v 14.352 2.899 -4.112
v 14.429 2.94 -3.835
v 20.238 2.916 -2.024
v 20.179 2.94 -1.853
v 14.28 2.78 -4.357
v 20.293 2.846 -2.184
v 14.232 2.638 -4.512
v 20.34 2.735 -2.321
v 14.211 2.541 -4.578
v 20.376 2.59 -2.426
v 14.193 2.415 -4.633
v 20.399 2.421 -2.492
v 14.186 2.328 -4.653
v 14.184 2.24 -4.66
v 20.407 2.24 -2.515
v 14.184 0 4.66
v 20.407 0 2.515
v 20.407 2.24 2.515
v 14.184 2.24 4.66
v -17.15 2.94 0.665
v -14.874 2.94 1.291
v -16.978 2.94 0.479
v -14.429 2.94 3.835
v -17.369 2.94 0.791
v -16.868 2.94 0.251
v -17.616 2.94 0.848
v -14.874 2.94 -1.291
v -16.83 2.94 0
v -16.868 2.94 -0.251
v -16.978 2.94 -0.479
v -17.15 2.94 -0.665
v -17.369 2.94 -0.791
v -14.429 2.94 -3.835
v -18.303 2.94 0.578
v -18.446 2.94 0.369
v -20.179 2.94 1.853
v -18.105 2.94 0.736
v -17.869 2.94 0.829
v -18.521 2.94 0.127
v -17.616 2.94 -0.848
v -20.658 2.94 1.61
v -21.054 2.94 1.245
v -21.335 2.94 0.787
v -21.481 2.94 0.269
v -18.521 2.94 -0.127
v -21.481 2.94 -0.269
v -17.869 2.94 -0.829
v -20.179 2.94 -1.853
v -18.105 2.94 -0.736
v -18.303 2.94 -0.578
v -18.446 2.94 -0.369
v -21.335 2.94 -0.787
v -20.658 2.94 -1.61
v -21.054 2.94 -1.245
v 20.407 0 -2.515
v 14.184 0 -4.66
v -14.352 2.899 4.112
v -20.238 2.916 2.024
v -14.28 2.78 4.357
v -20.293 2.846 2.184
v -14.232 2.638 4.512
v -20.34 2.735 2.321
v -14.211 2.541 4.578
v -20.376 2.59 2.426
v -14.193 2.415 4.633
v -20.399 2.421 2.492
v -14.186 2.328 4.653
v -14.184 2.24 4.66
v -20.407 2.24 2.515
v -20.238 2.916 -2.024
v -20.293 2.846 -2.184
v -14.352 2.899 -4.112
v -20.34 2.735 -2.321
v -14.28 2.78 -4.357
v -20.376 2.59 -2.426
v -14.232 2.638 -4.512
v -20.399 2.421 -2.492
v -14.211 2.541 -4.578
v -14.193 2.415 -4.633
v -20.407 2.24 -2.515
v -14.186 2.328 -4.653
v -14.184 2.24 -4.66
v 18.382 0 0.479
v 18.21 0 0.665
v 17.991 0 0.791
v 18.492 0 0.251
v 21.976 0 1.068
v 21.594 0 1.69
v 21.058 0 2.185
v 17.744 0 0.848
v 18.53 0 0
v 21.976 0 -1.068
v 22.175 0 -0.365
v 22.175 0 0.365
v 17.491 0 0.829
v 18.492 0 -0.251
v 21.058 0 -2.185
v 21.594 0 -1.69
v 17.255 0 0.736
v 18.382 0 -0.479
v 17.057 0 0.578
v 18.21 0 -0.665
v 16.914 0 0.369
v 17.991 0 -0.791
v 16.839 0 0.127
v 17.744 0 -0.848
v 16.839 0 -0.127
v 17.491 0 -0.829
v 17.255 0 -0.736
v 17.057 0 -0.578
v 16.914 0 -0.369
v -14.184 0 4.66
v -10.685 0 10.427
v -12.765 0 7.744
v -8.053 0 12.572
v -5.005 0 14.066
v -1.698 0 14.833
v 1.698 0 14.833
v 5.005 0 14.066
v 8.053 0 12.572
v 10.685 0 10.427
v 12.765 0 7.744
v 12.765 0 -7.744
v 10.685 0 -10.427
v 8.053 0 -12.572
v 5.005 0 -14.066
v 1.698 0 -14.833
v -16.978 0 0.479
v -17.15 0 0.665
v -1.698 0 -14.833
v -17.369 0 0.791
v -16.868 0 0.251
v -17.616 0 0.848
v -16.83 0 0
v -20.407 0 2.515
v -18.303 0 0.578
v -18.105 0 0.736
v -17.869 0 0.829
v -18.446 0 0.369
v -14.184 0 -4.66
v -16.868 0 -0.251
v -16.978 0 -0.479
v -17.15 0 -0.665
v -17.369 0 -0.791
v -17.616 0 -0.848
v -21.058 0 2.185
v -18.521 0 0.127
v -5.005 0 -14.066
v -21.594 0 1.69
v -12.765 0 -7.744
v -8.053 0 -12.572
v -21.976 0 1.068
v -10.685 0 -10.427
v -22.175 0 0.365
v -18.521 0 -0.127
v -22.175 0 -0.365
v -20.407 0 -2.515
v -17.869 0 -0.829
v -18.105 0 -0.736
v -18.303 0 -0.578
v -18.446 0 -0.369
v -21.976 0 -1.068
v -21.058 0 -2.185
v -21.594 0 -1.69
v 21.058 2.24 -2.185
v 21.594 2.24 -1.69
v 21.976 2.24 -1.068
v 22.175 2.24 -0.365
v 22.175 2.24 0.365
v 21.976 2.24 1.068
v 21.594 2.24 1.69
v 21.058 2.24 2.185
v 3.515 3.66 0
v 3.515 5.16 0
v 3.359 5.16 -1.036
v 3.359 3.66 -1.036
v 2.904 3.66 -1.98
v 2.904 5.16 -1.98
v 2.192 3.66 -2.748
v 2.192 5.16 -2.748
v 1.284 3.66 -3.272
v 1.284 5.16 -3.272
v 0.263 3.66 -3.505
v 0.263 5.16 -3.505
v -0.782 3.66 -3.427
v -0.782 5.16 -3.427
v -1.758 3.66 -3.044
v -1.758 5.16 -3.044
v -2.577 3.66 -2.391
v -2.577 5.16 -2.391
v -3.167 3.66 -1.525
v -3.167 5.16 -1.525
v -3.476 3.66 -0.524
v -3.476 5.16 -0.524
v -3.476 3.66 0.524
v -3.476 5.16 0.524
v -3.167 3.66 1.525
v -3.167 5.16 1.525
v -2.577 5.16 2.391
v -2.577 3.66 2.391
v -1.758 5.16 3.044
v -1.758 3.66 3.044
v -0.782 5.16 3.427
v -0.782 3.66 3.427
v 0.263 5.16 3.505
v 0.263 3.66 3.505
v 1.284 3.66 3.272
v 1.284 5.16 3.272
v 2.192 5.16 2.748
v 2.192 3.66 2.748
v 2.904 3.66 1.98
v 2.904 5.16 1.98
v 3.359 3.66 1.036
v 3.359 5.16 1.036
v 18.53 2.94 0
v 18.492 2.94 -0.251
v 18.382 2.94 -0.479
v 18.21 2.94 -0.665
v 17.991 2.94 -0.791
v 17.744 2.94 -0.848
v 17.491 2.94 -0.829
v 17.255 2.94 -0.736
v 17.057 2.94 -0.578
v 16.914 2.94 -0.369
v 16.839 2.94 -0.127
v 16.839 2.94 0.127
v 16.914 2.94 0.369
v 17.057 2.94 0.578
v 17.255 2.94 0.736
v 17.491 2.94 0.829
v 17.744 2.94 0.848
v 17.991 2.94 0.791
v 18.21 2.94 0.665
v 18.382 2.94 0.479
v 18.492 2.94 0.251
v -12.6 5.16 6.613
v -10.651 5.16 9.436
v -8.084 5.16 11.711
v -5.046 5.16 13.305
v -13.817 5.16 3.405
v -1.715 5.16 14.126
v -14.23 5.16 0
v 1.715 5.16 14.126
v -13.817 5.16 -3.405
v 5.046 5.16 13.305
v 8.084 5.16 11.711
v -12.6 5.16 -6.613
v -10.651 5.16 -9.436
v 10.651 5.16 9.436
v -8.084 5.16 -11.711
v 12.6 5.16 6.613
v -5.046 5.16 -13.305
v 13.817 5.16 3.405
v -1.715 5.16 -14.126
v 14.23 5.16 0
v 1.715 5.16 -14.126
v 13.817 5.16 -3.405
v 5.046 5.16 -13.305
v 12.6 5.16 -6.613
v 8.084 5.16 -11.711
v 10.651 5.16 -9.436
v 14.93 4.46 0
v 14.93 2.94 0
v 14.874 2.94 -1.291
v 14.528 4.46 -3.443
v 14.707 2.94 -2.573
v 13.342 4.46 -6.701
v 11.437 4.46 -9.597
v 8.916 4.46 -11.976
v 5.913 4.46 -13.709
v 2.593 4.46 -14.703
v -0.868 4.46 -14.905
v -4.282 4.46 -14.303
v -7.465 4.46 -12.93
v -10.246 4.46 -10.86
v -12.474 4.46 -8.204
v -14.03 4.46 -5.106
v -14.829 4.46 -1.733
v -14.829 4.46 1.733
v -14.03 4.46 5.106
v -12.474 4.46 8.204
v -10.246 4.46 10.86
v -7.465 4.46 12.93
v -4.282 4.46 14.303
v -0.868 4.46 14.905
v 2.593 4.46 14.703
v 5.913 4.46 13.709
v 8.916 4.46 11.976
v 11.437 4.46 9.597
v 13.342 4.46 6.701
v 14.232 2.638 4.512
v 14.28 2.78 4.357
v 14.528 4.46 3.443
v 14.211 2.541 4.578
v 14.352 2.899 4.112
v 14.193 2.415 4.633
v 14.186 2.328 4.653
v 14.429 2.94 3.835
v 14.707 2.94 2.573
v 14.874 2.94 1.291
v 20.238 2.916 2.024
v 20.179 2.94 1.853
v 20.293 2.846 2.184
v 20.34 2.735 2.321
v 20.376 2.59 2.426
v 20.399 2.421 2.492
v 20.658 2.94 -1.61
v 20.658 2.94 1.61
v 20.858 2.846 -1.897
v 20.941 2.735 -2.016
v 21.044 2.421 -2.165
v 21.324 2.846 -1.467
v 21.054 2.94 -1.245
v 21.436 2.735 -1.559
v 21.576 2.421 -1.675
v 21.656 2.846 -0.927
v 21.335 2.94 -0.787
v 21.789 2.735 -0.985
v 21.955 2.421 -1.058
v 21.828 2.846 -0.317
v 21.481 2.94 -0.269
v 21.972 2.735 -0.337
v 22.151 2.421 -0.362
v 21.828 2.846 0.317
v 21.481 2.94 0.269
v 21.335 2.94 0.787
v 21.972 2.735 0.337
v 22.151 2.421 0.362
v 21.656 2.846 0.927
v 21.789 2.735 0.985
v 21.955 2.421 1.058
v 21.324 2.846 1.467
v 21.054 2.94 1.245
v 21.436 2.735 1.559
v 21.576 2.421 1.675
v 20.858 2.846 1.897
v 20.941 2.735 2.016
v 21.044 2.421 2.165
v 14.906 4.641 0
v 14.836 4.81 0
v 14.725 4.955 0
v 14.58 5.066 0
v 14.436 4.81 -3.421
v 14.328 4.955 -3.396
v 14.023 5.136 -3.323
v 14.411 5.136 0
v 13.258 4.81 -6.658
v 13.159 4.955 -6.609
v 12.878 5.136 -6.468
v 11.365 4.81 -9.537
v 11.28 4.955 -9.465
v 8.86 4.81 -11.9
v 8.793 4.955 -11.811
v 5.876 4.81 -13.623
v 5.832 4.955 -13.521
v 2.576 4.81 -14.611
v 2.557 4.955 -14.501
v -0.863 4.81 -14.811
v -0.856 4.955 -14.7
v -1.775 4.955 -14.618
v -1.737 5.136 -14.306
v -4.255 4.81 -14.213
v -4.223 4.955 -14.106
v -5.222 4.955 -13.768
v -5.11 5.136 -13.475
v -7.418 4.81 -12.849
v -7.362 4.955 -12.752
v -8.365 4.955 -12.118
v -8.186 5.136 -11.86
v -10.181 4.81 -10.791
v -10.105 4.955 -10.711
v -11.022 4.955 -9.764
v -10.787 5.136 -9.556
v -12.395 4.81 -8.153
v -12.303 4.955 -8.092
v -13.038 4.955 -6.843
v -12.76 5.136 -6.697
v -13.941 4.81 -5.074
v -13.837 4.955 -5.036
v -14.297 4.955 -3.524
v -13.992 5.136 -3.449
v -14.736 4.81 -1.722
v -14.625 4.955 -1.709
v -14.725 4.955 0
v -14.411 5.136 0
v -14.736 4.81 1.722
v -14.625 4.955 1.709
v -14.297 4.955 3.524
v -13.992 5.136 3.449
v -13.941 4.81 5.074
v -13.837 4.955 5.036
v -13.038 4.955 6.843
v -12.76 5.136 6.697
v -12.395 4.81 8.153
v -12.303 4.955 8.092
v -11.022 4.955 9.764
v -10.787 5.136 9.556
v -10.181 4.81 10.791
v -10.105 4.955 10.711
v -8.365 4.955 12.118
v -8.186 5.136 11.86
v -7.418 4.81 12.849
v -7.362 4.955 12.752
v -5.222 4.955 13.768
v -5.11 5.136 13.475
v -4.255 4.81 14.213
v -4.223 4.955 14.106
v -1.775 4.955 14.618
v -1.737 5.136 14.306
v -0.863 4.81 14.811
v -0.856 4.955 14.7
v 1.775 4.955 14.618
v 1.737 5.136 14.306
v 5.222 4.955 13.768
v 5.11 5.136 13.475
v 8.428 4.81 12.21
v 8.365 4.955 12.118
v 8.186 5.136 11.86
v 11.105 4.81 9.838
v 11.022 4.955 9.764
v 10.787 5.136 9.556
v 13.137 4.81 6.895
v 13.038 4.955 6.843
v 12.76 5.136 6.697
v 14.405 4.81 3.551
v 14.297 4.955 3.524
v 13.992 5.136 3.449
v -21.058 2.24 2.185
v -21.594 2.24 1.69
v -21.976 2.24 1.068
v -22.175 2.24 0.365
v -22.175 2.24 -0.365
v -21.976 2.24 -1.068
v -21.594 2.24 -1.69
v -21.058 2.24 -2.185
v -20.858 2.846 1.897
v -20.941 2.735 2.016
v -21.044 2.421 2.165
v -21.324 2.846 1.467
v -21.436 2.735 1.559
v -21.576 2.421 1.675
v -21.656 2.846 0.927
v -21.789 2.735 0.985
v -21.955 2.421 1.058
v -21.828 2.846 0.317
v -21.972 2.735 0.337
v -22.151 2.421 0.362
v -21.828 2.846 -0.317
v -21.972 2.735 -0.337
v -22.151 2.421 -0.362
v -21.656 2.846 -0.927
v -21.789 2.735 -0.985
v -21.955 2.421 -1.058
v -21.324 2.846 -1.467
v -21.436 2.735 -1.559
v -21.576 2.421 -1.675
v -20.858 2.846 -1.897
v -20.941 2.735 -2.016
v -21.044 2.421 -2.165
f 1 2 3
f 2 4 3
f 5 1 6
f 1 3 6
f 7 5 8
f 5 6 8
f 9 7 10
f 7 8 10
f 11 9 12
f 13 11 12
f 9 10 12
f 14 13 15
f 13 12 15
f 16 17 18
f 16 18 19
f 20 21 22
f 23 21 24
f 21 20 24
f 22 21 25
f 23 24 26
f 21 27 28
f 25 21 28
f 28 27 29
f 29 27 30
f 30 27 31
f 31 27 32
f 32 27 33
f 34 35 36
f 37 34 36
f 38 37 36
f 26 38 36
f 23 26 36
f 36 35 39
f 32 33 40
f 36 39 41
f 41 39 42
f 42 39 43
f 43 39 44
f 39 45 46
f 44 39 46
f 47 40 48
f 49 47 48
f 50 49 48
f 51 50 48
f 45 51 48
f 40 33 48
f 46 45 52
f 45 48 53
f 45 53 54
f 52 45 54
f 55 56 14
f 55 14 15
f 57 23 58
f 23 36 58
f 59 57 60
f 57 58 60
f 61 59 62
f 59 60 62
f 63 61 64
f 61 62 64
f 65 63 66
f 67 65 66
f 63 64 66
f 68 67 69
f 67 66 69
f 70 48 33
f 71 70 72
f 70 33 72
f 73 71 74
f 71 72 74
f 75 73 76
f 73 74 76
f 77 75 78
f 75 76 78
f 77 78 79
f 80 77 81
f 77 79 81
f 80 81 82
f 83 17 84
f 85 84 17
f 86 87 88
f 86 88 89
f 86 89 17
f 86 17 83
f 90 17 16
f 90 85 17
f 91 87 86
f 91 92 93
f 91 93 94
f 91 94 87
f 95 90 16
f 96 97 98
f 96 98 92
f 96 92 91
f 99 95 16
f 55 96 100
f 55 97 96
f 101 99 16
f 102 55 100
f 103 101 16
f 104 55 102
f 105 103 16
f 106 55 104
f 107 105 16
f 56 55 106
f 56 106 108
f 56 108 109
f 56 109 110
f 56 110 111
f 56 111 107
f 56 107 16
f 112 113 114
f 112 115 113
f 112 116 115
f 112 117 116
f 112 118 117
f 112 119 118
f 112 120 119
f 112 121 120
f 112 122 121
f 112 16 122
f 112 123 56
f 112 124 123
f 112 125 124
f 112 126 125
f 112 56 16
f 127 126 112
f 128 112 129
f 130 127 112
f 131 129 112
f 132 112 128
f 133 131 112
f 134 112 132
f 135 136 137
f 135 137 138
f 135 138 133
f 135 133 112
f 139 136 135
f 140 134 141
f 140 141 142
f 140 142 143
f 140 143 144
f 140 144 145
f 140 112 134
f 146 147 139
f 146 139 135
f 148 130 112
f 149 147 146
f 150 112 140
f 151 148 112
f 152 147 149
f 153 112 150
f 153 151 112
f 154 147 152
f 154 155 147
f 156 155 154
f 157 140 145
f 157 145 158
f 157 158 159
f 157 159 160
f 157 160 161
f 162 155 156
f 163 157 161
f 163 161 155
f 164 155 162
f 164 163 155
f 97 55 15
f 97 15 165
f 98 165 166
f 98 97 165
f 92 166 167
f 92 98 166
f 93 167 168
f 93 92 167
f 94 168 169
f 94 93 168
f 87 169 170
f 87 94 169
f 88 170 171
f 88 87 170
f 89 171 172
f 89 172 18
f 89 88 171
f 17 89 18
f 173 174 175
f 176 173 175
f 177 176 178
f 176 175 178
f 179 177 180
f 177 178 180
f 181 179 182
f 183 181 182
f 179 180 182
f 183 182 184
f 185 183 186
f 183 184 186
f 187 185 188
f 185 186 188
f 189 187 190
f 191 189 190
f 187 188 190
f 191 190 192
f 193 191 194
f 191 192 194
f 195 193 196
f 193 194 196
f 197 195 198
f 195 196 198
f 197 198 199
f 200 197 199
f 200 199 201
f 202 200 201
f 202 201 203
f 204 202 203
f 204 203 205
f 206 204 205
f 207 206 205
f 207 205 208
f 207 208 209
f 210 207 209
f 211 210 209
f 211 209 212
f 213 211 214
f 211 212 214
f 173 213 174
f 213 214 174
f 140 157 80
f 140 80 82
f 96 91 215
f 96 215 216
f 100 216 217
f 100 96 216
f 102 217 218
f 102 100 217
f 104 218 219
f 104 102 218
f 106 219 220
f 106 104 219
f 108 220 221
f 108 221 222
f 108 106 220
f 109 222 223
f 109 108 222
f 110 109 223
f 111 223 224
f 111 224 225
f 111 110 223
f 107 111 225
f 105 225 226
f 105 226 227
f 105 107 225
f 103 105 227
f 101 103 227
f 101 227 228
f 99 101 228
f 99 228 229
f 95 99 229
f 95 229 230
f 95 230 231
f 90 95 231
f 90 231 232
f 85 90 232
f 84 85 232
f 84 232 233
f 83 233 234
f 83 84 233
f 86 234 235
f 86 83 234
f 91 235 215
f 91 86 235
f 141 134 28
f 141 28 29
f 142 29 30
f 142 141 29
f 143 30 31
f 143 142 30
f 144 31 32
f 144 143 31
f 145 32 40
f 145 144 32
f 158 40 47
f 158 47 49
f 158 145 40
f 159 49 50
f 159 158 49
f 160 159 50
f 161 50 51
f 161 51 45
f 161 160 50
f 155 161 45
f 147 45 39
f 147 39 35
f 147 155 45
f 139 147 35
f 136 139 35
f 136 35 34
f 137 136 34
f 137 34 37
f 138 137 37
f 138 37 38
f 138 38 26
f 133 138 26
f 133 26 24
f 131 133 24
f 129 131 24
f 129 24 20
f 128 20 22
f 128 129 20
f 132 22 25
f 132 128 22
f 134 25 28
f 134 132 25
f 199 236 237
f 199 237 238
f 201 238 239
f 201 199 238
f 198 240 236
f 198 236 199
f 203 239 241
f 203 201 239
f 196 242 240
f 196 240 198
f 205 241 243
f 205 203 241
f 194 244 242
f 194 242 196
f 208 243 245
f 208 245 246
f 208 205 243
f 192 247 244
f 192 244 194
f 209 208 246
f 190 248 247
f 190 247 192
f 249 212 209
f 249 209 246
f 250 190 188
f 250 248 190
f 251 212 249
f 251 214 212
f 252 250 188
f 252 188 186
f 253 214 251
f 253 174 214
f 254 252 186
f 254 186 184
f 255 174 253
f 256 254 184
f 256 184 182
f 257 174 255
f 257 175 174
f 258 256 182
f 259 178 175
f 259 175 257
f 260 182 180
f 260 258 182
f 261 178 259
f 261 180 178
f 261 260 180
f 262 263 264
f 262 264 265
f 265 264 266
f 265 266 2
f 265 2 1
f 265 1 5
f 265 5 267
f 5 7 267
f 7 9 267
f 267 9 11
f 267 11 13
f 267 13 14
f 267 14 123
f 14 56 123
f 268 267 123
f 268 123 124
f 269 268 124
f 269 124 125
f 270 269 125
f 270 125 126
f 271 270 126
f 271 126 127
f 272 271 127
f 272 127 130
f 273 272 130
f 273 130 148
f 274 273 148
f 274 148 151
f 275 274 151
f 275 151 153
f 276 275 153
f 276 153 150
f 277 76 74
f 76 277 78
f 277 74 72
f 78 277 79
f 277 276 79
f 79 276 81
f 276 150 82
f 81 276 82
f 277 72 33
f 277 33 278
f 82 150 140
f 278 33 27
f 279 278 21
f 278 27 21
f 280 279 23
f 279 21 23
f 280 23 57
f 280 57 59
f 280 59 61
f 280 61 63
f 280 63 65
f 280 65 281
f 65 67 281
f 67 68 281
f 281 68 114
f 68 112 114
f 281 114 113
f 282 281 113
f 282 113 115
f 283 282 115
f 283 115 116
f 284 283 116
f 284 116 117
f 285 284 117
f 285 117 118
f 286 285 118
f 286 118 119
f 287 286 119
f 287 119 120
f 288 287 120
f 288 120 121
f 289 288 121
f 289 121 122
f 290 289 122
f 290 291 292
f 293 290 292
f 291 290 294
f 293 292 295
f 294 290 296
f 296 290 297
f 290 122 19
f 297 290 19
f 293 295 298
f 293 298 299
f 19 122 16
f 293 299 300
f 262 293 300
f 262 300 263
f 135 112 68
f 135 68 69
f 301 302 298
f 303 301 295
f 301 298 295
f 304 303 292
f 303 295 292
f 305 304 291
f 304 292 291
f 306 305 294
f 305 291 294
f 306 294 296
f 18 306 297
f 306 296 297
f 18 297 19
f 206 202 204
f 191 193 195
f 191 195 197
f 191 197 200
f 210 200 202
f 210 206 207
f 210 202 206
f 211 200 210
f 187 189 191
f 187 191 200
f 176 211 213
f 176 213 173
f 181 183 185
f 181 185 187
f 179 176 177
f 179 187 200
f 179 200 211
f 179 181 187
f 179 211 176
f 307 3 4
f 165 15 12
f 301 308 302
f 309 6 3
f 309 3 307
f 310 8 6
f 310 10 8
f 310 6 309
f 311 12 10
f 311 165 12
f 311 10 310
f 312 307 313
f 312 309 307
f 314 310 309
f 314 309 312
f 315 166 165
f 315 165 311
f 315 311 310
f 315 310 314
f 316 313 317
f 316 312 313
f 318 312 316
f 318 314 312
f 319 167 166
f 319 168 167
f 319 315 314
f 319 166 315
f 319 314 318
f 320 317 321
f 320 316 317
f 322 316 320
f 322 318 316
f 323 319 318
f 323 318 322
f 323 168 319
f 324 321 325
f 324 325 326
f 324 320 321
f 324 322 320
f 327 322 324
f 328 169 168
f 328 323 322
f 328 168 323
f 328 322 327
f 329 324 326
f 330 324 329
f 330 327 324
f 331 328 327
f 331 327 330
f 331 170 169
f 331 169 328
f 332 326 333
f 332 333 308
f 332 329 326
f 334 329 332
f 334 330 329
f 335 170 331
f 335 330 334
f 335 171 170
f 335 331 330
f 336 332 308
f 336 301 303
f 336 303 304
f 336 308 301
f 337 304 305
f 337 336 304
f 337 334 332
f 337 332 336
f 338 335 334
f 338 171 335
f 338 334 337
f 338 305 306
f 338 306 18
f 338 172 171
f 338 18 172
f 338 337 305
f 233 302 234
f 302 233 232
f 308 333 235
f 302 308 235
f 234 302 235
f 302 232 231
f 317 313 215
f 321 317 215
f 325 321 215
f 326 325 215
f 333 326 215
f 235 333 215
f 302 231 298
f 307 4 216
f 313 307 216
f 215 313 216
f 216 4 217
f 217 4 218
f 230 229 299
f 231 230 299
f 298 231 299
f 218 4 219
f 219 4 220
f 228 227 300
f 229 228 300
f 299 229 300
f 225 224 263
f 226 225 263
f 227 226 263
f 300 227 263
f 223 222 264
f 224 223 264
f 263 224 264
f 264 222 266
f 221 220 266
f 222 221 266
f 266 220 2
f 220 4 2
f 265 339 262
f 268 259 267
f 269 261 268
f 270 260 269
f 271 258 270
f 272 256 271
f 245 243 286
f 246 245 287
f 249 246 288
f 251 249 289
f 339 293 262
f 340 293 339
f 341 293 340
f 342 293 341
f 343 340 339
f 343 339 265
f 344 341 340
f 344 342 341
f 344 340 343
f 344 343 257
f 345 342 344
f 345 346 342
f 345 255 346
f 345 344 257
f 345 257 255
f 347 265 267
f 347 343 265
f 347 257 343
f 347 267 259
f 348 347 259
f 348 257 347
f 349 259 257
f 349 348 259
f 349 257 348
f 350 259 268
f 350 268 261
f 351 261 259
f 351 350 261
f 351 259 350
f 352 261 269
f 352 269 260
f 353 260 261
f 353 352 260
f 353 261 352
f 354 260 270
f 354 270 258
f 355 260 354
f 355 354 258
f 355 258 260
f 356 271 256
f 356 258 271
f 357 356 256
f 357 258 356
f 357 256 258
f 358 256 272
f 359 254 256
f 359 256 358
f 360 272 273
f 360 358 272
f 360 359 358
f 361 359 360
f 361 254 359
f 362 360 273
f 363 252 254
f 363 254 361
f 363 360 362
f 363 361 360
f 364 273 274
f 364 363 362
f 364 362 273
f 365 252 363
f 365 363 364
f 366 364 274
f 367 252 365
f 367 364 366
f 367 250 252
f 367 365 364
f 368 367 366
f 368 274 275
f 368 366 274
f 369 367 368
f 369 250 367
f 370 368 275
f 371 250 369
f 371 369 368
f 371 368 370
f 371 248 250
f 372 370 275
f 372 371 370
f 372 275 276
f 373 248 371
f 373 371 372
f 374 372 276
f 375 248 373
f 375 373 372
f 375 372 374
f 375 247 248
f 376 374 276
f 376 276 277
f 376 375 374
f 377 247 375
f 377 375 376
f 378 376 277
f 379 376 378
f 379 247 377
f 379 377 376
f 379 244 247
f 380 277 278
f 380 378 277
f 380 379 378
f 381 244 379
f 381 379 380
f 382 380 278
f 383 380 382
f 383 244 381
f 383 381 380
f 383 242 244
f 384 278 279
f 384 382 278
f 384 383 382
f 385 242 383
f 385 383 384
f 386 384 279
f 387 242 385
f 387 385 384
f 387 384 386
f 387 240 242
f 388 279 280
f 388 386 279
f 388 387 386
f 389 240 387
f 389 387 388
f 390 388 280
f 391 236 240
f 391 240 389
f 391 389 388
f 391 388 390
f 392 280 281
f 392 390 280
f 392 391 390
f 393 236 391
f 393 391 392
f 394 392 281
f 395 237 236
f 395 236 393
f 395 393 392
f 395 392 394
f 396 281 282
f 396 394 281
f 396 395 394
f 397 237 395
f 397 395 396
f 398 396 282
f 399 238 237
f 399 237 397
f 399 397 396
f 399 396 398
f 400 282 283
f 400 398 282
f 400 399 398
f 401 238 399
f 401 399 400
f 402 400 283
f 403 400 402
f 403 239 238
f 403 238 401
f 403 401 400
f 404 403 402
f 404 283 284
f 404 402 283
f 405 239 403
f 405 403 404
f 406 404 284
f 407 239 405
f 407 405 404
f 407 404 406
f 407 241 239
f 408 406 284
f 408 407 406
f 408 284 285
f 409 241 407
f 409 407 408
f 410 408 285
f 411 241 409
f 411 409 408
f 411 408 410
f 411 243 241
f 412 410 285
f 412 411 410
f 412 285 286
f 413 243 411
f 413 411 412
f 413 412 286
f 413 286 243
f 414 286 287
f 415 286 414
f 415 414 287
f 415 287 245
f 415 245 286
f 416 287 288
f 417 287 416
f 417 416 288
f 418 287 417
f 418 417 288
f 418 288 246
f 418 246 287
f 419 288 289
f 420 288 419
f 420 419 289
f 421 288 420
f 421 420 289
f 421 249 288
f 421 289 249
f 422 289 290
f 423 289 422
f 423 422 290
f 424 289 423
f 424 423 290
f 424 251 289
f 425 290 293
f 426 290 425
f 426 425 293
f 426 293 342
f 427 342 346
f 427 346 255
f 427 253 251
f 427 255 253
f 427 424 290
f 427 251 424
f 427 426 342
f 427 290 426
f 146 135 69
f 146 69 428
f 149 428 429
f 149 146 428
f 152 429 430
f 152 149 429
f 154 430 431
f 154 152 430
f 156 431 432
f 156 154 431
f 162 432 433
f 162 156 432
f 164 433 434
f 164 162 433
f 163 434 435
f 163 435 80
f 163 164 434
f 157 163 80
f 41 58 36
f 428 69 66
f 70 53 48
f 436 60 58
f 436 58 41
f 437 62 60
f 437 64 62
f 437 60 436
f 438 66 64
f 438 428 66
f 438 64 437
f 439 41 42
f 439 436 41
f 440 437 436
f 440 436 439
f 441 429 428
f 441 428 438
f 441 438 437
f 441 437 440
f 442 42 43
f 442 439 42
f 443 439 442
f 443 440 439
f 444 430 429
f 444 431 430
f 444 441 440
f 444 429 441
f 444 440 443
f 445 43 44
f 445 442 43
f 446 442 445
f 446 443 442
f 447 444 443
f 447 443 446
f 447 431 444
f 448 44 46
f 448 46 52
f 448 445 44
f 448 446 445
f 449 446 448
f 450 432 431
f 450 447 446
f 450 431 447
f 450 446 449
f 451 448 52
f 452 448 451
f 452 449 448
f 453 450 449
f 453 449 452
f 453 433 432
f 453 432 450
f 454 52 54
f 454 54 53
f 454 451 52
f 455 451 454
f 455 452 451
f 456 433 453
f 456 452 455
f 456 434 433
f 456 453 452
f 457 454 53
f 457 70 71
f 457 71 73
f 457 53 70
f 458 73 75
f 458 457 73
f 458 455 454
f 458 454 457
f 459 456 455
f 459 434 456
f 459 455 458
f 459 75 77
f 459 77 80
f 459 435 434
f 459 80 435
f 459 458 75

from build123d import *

# Parameters (mm, degrees)
SKETCH1_R           = 14.93
BOSS_EXTRUDE1_DEPTH = 5.16
SKETCH2_R           = 0.85
BOSS_EXTRUDE2_DEPTH = 2.94
FILLET2_R           = 0.7
FILLET4_R           = 0.7
SKETCH3_R           = 3.515
CUT_EXTRUDE1_DEPTH  = 1.5


with BuildPart() as part:
    # Sketch1 → Boss-Extrude1 (new body)
    with BuildSketch(Plane(origin=(0, 0, 0), x_dir=(1, 0, 0), z_dir=(0, 1, 0))):
        Circle(SKETCH1_R)
    extrude(amount=BOSS_EXTRUDE1_DEPTH)

    # Sketch2 → Boss-Extrude2 (add)
    with BuildSketch(Plane(origin=(0, 0, 0), x_dir=(1, 0, 0), z_dir=(0, 1, 0))):
        with BuildLine():
            Line((-14.184219953, -4.659700025), (-20.406728453, -2.514915627))
            ThreePointArc((-20.406728453, -2.514915627), (-22.2, 0), (-20.406728453, 2.514915627))
            Line((-20.406728453, 2.514915627), (-14.184219953, 4.659700025))
            ThreePointArc((-14.184219953, 4.659700025), (-14.93, 0), (-14.184219953, -4.659700025))
        make_face()
        with Locations((-17.68, 0)):
            Circle(SKETCH2_R, mode=Mode.SUBTRACT)
        with BuildLine():
            Line((14.184219953, 4.659700025), (20.406728453, 2.514915627))
            ThreePointArc((20.406728453, 2.514915627), (22.2, 0), (20.406728453, -2.514915627))
            Line((20.406728453, -2.514915627), (14.184219953, -4.659700025))
            ThreePointArc((14.184219953, -4.659700025), (14.93, 0), (14.184219953, 4.659700025))
        make_face()
        with Locations((17.68, 0)):
            Circle(SKETCH2_R, mode=Mode.SUBTRACT)
    extrude(amount=BOSS_EXTRUDE2_DEPTH)

    # Fillet2
    fillet2_edges = [part.edges().sort_by_distance(p)[0] for p in [
        (-14.93, 5.16, 0),
    ]]
    fillet(fillet2_edges, radius=FILLET2_R)

    # Fillet4
    fillet4_edges = [part.edges().sort_by_distance(p)[0] for p in [
        (-22.2, 2.94, 0),
        (-17.295474203, 2.94, 3.587307826),
        (-17.295474203, 2.94, -3.587307826),
        (17.295474203, 2.94, 3.587307826),
        (22.2, 2.94, 0),
        (17.295474203, 2.94, -3.587307826),
    ]]
    fillet(fillet4_edges, radius=FILLET4_R)

    # Sketch3 → Cut-Extrude1 (cut)
    with BuildSketch(Plane(origin=(0, 5.16, 0), x_dir=(1, 0, 0), z_dir=(0, 1, 0))):
        Circle(SKETCH3_R)
    extrude(amount=-CUT_EXTRUDE1_DEPTH, mode=Mode.SUBTRACT)


solid = part.part
